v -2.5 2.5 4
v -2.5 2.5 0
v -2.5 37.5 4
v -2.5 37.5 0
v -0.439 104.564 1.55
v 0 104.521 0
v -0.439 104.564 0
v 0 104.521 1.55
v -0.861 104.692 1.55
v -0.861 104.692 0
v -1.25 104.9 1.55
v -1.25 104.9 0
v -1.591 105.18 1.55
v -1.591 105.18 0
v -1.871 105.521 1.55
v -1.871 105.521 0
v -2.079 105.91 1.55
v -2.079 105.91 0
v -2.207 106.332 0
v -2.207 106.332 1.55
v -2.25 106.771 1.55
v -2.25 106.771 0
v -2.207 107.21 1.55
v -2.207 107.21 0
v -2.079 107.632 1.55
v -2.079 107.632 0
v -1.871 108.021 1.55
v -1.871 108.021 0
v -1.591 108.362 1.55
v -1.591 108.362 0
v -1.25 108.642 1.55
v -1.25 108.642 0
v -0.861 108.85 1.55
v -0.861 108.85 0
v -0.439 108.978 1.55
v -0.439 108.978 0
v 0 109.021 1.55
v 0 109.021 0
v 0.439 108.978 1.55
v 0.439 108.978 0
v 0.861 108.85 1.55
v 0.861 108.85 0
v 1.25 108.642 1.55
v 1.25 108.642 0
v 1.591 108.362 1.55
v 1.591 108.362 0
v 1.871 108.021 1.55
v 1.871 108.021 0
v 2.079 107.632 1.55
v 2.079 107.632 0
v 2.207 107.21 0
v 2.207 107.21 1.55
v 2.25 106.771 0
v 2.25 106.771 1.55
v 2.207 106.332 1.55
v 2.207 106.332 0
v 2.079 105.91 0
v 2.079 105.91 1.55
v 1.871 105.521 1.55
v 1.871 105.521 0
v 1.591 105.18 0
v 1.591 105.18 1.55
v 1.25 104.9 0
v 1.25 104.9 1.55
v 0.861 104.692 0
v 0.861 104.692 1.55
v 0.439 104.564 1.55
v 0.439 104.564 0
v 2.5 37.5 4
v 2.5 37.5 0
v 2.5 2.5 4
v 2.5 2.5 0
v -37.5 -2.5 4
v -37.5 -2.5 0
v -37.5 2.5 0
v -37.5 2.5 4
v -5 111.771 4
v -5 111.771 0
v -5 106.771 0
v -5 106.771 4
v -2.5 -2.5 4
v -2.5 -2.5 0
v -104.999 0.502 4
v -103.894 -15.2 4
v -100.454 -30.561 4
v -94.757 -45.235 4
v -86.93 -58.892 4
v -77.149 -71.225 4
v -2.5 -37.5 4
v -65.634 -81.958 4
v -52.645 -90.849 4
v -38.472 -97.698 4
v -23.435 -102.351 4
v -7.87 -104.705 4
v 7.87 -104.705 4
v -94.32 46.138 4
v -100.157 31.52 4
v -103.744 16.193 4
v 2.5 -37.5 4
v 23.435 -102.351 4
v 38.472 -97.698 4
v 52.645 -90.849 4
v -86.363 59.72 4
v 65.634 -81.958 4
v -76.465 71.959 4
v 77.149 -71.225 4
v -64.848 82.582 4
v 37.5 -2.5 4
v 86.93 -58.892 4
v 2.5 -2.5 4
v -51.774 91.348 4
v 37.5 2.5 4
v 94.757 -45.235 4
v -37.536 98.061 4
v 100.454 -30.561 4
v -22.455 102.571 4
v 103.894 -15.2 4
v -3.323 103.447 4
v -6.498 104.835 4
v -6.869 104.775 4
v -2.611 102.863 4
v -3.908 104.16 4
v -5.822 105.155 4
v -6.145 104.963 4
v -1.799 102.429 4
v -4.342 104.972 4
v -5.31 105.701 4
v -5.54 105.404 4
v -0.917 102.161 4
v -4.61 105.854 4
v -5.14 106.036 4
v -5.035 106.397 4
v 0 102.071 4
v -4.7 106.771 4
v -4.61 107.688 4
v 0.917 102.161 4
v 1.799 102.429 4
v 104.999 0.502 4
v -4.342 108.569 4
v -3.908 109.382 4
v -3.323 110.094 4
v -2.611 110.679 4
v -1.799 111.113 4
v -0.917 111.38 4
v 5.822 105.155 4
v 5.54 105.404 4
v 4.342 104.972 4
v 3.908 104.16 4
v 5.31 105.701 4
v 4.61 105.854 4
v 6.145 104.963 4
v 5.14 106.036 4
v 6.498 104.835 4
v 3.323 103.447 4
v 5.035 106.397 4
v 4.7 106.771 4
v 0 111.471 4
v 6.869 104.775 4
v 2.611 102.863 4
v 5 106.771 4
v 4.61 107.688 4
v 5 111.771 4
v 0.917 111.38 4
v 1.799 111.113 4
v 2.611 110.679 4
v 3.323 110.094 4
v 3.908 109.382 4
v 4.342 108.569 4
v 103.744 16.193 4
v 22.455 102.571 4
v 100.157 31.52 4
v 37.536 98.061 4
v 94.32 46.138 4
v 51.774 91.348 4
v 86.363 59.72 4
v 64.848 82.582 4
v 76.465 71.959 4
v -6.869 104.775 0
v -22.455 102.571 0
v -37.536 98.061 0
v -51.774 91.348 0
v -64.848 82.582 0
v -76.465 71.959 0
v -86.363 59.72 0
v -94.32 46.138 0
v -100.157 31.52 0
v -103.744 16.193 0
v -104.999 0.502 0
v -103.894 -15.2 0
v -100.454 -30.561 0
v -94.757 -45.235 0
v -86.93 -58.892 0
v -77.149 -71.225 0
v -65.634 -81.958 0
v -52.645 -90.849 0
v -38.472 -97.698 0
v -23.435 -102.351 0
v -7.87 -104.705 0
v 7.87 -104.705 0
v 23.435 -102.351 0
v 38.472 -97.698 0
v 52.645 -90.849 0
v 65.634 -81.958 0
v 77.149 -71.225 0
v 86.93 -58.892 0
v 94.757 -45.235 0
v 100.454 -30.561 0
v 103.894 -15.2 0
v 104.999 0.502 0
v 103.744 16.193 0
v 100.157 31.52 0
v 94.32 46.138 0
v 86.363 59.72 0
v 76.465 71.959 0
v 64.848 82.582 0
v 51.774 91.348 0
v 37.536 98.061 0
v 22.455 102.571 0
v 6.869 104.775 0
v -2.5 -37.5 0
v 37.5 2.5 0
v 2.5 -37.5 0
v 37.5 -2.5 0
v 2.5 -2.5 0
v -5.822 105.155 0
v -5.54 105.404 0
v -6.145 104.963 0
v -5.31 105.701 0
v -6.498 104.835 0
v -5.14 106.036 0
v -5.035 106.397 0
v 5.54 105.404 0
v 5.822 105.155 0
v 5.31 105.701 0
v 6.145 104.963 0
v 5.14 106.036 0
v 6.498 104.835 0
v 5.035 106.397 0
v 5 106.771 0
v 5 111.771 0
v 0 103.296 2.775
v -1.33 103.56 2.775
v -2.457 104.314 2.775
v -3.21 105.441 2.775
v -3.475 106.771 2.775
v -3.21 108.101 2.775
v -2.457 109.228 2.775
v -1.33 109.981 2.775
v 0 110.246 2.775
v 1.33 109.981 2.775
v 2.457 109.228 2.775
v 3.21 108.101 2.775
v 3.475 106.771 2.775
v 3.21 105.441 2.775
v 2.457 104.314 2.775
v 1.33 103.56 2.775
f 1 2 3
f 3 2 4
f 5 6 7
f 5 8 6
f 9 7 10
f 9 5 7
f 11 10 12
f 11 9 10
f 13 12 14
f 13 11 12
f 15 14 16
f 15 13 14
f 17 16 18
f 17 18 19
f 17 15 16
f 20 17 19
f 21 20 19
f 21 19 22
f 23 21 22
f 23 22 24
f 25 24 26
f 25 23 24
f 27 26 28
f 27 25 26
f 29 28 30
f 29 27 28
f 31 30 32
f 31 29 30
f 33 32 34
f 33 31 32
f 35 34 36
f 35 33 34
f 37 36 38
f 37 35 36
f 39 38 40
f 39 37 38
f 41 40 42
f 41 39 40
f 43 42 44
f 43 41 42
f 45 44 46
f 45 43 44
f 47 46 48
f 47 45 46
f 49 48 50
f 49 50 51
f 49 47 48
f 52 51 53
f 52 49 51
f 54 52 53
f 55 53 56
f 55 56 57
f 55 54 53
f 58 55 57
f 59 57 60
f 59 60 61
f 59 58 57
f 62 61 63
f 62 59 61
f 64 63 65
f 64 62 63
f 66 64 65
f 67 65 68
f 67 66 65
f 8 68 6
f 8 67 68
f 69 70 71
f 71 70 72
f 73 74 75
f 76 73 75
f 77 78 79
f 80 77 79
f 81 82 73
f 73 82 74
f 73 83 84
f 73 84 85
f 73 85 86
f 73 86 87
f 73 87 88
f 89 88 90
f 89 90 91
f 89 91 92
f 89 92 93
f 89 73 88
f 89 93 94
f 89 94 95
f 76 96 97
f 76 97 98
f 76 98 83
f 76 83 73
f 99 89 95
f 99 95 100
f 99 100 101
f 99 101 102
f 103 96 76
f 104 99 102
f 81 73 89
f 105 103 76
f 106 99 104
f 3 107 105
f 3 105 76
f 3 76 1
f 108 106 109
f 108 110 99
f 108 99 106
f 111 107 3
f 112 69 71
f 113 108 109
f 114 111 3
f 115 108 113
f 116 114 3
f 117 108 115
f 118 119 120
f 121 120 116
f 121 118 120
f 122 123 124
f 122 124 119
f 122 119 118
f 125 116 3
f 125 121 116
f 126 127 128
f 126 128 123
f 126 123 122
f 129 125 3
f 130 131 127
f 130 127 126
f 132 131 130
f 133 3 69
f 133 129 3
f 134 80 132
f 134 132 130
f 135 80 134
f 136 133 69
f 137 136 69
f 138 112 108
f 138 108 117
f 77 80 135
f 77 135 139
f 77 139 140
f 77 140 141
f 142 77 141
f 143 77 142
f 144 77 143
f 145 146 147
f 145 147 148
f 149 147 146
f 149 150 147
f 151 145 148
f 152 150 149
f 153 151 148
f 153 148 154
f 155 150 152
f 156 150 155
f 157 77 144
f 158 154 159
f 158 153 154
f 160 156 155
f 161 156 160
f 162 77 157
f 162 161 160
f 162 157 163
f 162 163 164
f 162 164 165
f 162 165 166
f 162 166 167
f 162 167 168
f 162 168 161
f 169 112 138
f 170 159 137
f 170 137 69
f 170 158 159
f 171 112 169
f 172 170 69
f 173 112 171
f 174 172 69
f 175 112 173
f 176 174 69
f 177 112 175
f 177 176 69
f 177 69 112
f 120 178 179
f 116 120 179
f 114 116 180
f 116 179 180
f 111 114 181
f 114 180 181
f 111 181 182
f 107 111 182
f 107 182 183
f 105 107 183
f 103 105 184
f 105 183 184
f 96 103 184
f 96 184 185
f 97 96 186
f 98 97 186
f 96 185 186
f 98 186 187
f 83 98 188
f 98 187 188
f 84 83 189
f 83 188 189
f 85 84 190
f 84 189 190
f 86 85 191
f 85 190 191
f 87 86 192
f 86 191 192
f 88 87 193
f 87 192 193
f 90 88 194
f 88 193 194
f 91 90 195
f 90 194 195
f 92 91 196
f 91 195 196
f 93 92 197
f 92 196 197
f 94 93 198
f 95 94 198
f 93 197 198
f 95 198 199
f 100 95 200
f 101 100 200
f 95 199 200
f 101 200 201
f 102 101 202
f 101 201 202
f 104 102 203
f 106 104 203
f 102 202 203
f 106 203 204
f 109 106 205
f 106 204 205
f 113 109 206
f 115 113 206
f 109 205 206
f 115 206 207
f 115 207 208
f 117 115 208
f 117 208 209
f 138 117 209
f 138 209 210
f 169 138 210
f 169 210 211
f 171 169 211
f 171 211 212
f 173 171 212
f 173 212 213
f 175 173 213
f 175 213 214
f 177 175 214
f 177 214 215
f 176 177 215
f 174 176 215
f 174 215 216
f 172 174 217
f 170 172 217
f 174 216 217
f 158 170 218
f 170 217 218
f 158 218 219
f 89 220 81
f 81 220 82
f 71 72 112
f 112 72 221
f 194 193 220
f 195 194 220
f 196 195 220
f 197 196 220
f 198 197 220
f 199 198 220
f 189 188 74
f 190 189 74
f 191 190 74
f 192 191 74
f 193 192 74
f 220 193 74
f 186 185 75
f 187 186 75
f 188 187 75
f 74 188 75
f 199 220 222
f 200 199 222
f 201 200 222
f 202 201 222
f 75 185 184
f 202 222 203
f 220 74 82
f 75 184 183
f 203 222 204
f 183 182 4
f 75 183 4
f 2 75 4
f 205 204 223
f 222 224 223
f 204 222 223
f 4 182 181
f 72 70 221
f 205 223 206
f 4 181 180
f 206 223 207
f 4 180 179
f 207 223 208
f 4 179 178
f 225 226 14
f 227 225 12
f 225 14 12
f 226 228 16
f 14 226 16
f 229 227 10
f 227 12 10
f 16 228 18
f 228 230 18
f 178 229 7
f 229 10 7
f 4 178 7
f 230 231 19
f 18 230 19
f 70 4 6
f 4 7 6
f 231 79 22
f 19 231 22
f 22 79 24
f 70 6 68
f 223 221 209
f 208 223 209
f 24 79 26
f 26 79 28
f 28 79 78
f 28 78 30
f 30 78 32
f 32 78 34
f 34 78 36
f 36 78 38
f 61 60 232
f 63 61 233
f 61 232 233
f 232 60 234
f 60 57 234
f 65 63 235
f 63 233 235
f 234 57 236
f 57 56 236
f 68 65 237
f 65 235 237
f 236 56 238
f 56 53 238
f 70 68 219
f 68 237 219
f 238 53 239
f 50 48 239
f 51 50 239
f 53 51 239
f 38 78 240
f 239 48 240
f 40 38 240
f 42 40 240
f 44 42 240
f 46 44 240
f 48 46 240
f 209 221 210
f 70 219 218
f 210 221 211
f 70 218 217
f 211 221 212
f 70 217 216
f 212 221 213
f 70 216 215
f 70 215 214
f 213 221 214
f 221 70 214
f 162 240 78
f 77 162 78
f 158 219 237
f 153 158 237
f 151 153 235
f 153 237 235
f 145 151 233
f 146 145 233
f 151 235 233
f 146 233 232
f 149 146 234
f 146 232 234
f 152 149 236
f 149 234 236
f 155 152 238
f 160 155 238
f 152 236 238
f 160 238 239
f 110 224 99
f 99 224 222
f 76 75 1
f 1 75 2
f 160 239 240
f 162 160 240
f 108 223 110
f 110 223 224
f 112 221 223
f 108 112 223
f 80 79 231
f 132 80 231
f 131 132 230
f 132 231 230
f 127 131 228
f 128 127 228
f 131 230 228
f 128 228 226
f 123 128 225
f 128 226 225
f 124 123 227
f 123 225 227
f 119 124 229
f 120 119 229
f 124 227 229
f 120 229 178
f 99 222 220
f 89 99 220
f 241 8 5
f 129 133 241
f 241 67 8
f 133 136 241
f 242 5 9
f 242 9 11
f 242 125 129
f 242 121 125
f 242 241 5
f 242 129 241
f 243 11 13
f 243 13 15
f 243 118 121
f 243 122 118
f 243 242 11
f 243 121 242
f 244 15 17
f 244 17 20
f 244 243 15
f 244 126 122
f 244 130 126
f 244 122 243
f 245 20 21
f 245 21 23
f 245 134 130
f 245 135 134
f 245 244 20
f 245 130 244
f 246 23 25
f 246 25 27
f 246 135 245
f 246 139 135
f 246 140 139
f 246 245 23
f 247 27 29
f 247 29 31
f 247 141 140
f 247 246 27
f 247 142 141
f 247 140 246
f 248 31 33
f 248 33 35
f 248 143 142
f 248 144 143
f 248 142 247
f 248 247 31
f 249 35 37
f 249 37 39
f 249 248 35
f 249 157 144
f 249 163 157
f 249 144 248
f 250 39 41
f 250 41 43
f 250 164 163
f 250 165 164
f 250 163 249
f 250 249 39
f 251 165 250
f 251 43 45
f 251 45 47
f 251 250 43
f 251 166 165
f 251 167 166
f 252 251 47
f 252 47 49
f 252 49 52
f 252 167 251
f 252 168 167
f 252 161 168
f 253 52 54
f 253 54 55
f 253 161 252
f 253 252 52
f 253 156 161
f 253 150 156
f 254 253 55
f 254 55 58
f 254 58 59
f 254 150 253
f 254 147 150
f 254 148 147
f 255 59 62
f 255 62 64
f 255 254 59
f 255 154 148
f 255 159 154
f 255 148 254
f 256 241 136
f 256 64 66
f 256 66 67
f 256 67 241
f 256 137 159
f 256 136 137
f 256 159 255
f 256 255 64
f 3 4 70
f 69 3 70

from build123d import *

# Parameters (mm, degrees)
BOSS_EXTRUDE1_DEPTH = 4
CUT_EXTRUDE1_REACH  = 155.407


with BuildPart() as part:
    # Sketch1 → Boss-Extrude1 (new body)
    with BuildSketch(Plane.XY):
        with BuildLine():
            Line((5, 106.77078252), (5, 111.77078252))
            Line((5, 111.77078252), (-5, 111.77078252))
            Line((-5, 111.77078252), (-5, 106.77078252))
            ThreePointArc((-5, 106.77078252), (-5.540259913, 105.403610666), (-6.869158879, 104.775066959))
            ThreePointArc((-6.869158879, 104.775066959), (0, -105), (6.869158879, 104.775066959))
            ThreePointArc((6.869158879, 104.775066959), (5.540259913, 105.403610666), (5, 106.77078252))
        make_face()
    extrude(amount=BOSS_EXTRUDE1_DEPTH)

    # Sketch2 → Cut-Extrude1 (cut, up to next)
    with BuildSketch(Plane(origin=(0, 0, 0), x_dir=(-1, 0, 0), z_dir=(0, 0, -1)), mode=Mode.PRIVATE) as cut_extrude1_sk1:
        Polygon((-2.5, -2.5), (-2.5, -37.5), (2.5, -37.5), (2.5, -2.5), (37.5, -2.5), (37.5, 2.5), (2.5, 2.5), (2.5, 37.5), (-2.5, 37.5), (-2.5, 2.5), (-37.5, 2.5), (-37.5, -2.5), align=None)
    cut_extrude1_tool1 = extrude(cut_extrude1_sk1.sketch, amount=-CUT_EXTRUDE1_REACH, mode=Mode.PRIVATE) & part.part
    add(cut_extrude1_tool1.solids().sort_by_distance((0, 0, 0))[0], mode=Mode.SUBTRACT)

    # Sketch3 → CSK for M4 Countersunk Flat Head Screw1 (revolve, cut)
    with BuildSketch(Plane(origin=(0, 106.77078252, 4), x_dir=(0, -1, 0), z_dir=(1, 0, 0))):
        Polygon((0, 0), (0, 4), (2.25, 4), (2.25, 2.45), (4.7, 0), align=None)
    revolve(axis=Axis((0, 106.77078252, 10.35), (0, 0, -1)), mode=Mode.SUBTRACT)


solid = part.part
